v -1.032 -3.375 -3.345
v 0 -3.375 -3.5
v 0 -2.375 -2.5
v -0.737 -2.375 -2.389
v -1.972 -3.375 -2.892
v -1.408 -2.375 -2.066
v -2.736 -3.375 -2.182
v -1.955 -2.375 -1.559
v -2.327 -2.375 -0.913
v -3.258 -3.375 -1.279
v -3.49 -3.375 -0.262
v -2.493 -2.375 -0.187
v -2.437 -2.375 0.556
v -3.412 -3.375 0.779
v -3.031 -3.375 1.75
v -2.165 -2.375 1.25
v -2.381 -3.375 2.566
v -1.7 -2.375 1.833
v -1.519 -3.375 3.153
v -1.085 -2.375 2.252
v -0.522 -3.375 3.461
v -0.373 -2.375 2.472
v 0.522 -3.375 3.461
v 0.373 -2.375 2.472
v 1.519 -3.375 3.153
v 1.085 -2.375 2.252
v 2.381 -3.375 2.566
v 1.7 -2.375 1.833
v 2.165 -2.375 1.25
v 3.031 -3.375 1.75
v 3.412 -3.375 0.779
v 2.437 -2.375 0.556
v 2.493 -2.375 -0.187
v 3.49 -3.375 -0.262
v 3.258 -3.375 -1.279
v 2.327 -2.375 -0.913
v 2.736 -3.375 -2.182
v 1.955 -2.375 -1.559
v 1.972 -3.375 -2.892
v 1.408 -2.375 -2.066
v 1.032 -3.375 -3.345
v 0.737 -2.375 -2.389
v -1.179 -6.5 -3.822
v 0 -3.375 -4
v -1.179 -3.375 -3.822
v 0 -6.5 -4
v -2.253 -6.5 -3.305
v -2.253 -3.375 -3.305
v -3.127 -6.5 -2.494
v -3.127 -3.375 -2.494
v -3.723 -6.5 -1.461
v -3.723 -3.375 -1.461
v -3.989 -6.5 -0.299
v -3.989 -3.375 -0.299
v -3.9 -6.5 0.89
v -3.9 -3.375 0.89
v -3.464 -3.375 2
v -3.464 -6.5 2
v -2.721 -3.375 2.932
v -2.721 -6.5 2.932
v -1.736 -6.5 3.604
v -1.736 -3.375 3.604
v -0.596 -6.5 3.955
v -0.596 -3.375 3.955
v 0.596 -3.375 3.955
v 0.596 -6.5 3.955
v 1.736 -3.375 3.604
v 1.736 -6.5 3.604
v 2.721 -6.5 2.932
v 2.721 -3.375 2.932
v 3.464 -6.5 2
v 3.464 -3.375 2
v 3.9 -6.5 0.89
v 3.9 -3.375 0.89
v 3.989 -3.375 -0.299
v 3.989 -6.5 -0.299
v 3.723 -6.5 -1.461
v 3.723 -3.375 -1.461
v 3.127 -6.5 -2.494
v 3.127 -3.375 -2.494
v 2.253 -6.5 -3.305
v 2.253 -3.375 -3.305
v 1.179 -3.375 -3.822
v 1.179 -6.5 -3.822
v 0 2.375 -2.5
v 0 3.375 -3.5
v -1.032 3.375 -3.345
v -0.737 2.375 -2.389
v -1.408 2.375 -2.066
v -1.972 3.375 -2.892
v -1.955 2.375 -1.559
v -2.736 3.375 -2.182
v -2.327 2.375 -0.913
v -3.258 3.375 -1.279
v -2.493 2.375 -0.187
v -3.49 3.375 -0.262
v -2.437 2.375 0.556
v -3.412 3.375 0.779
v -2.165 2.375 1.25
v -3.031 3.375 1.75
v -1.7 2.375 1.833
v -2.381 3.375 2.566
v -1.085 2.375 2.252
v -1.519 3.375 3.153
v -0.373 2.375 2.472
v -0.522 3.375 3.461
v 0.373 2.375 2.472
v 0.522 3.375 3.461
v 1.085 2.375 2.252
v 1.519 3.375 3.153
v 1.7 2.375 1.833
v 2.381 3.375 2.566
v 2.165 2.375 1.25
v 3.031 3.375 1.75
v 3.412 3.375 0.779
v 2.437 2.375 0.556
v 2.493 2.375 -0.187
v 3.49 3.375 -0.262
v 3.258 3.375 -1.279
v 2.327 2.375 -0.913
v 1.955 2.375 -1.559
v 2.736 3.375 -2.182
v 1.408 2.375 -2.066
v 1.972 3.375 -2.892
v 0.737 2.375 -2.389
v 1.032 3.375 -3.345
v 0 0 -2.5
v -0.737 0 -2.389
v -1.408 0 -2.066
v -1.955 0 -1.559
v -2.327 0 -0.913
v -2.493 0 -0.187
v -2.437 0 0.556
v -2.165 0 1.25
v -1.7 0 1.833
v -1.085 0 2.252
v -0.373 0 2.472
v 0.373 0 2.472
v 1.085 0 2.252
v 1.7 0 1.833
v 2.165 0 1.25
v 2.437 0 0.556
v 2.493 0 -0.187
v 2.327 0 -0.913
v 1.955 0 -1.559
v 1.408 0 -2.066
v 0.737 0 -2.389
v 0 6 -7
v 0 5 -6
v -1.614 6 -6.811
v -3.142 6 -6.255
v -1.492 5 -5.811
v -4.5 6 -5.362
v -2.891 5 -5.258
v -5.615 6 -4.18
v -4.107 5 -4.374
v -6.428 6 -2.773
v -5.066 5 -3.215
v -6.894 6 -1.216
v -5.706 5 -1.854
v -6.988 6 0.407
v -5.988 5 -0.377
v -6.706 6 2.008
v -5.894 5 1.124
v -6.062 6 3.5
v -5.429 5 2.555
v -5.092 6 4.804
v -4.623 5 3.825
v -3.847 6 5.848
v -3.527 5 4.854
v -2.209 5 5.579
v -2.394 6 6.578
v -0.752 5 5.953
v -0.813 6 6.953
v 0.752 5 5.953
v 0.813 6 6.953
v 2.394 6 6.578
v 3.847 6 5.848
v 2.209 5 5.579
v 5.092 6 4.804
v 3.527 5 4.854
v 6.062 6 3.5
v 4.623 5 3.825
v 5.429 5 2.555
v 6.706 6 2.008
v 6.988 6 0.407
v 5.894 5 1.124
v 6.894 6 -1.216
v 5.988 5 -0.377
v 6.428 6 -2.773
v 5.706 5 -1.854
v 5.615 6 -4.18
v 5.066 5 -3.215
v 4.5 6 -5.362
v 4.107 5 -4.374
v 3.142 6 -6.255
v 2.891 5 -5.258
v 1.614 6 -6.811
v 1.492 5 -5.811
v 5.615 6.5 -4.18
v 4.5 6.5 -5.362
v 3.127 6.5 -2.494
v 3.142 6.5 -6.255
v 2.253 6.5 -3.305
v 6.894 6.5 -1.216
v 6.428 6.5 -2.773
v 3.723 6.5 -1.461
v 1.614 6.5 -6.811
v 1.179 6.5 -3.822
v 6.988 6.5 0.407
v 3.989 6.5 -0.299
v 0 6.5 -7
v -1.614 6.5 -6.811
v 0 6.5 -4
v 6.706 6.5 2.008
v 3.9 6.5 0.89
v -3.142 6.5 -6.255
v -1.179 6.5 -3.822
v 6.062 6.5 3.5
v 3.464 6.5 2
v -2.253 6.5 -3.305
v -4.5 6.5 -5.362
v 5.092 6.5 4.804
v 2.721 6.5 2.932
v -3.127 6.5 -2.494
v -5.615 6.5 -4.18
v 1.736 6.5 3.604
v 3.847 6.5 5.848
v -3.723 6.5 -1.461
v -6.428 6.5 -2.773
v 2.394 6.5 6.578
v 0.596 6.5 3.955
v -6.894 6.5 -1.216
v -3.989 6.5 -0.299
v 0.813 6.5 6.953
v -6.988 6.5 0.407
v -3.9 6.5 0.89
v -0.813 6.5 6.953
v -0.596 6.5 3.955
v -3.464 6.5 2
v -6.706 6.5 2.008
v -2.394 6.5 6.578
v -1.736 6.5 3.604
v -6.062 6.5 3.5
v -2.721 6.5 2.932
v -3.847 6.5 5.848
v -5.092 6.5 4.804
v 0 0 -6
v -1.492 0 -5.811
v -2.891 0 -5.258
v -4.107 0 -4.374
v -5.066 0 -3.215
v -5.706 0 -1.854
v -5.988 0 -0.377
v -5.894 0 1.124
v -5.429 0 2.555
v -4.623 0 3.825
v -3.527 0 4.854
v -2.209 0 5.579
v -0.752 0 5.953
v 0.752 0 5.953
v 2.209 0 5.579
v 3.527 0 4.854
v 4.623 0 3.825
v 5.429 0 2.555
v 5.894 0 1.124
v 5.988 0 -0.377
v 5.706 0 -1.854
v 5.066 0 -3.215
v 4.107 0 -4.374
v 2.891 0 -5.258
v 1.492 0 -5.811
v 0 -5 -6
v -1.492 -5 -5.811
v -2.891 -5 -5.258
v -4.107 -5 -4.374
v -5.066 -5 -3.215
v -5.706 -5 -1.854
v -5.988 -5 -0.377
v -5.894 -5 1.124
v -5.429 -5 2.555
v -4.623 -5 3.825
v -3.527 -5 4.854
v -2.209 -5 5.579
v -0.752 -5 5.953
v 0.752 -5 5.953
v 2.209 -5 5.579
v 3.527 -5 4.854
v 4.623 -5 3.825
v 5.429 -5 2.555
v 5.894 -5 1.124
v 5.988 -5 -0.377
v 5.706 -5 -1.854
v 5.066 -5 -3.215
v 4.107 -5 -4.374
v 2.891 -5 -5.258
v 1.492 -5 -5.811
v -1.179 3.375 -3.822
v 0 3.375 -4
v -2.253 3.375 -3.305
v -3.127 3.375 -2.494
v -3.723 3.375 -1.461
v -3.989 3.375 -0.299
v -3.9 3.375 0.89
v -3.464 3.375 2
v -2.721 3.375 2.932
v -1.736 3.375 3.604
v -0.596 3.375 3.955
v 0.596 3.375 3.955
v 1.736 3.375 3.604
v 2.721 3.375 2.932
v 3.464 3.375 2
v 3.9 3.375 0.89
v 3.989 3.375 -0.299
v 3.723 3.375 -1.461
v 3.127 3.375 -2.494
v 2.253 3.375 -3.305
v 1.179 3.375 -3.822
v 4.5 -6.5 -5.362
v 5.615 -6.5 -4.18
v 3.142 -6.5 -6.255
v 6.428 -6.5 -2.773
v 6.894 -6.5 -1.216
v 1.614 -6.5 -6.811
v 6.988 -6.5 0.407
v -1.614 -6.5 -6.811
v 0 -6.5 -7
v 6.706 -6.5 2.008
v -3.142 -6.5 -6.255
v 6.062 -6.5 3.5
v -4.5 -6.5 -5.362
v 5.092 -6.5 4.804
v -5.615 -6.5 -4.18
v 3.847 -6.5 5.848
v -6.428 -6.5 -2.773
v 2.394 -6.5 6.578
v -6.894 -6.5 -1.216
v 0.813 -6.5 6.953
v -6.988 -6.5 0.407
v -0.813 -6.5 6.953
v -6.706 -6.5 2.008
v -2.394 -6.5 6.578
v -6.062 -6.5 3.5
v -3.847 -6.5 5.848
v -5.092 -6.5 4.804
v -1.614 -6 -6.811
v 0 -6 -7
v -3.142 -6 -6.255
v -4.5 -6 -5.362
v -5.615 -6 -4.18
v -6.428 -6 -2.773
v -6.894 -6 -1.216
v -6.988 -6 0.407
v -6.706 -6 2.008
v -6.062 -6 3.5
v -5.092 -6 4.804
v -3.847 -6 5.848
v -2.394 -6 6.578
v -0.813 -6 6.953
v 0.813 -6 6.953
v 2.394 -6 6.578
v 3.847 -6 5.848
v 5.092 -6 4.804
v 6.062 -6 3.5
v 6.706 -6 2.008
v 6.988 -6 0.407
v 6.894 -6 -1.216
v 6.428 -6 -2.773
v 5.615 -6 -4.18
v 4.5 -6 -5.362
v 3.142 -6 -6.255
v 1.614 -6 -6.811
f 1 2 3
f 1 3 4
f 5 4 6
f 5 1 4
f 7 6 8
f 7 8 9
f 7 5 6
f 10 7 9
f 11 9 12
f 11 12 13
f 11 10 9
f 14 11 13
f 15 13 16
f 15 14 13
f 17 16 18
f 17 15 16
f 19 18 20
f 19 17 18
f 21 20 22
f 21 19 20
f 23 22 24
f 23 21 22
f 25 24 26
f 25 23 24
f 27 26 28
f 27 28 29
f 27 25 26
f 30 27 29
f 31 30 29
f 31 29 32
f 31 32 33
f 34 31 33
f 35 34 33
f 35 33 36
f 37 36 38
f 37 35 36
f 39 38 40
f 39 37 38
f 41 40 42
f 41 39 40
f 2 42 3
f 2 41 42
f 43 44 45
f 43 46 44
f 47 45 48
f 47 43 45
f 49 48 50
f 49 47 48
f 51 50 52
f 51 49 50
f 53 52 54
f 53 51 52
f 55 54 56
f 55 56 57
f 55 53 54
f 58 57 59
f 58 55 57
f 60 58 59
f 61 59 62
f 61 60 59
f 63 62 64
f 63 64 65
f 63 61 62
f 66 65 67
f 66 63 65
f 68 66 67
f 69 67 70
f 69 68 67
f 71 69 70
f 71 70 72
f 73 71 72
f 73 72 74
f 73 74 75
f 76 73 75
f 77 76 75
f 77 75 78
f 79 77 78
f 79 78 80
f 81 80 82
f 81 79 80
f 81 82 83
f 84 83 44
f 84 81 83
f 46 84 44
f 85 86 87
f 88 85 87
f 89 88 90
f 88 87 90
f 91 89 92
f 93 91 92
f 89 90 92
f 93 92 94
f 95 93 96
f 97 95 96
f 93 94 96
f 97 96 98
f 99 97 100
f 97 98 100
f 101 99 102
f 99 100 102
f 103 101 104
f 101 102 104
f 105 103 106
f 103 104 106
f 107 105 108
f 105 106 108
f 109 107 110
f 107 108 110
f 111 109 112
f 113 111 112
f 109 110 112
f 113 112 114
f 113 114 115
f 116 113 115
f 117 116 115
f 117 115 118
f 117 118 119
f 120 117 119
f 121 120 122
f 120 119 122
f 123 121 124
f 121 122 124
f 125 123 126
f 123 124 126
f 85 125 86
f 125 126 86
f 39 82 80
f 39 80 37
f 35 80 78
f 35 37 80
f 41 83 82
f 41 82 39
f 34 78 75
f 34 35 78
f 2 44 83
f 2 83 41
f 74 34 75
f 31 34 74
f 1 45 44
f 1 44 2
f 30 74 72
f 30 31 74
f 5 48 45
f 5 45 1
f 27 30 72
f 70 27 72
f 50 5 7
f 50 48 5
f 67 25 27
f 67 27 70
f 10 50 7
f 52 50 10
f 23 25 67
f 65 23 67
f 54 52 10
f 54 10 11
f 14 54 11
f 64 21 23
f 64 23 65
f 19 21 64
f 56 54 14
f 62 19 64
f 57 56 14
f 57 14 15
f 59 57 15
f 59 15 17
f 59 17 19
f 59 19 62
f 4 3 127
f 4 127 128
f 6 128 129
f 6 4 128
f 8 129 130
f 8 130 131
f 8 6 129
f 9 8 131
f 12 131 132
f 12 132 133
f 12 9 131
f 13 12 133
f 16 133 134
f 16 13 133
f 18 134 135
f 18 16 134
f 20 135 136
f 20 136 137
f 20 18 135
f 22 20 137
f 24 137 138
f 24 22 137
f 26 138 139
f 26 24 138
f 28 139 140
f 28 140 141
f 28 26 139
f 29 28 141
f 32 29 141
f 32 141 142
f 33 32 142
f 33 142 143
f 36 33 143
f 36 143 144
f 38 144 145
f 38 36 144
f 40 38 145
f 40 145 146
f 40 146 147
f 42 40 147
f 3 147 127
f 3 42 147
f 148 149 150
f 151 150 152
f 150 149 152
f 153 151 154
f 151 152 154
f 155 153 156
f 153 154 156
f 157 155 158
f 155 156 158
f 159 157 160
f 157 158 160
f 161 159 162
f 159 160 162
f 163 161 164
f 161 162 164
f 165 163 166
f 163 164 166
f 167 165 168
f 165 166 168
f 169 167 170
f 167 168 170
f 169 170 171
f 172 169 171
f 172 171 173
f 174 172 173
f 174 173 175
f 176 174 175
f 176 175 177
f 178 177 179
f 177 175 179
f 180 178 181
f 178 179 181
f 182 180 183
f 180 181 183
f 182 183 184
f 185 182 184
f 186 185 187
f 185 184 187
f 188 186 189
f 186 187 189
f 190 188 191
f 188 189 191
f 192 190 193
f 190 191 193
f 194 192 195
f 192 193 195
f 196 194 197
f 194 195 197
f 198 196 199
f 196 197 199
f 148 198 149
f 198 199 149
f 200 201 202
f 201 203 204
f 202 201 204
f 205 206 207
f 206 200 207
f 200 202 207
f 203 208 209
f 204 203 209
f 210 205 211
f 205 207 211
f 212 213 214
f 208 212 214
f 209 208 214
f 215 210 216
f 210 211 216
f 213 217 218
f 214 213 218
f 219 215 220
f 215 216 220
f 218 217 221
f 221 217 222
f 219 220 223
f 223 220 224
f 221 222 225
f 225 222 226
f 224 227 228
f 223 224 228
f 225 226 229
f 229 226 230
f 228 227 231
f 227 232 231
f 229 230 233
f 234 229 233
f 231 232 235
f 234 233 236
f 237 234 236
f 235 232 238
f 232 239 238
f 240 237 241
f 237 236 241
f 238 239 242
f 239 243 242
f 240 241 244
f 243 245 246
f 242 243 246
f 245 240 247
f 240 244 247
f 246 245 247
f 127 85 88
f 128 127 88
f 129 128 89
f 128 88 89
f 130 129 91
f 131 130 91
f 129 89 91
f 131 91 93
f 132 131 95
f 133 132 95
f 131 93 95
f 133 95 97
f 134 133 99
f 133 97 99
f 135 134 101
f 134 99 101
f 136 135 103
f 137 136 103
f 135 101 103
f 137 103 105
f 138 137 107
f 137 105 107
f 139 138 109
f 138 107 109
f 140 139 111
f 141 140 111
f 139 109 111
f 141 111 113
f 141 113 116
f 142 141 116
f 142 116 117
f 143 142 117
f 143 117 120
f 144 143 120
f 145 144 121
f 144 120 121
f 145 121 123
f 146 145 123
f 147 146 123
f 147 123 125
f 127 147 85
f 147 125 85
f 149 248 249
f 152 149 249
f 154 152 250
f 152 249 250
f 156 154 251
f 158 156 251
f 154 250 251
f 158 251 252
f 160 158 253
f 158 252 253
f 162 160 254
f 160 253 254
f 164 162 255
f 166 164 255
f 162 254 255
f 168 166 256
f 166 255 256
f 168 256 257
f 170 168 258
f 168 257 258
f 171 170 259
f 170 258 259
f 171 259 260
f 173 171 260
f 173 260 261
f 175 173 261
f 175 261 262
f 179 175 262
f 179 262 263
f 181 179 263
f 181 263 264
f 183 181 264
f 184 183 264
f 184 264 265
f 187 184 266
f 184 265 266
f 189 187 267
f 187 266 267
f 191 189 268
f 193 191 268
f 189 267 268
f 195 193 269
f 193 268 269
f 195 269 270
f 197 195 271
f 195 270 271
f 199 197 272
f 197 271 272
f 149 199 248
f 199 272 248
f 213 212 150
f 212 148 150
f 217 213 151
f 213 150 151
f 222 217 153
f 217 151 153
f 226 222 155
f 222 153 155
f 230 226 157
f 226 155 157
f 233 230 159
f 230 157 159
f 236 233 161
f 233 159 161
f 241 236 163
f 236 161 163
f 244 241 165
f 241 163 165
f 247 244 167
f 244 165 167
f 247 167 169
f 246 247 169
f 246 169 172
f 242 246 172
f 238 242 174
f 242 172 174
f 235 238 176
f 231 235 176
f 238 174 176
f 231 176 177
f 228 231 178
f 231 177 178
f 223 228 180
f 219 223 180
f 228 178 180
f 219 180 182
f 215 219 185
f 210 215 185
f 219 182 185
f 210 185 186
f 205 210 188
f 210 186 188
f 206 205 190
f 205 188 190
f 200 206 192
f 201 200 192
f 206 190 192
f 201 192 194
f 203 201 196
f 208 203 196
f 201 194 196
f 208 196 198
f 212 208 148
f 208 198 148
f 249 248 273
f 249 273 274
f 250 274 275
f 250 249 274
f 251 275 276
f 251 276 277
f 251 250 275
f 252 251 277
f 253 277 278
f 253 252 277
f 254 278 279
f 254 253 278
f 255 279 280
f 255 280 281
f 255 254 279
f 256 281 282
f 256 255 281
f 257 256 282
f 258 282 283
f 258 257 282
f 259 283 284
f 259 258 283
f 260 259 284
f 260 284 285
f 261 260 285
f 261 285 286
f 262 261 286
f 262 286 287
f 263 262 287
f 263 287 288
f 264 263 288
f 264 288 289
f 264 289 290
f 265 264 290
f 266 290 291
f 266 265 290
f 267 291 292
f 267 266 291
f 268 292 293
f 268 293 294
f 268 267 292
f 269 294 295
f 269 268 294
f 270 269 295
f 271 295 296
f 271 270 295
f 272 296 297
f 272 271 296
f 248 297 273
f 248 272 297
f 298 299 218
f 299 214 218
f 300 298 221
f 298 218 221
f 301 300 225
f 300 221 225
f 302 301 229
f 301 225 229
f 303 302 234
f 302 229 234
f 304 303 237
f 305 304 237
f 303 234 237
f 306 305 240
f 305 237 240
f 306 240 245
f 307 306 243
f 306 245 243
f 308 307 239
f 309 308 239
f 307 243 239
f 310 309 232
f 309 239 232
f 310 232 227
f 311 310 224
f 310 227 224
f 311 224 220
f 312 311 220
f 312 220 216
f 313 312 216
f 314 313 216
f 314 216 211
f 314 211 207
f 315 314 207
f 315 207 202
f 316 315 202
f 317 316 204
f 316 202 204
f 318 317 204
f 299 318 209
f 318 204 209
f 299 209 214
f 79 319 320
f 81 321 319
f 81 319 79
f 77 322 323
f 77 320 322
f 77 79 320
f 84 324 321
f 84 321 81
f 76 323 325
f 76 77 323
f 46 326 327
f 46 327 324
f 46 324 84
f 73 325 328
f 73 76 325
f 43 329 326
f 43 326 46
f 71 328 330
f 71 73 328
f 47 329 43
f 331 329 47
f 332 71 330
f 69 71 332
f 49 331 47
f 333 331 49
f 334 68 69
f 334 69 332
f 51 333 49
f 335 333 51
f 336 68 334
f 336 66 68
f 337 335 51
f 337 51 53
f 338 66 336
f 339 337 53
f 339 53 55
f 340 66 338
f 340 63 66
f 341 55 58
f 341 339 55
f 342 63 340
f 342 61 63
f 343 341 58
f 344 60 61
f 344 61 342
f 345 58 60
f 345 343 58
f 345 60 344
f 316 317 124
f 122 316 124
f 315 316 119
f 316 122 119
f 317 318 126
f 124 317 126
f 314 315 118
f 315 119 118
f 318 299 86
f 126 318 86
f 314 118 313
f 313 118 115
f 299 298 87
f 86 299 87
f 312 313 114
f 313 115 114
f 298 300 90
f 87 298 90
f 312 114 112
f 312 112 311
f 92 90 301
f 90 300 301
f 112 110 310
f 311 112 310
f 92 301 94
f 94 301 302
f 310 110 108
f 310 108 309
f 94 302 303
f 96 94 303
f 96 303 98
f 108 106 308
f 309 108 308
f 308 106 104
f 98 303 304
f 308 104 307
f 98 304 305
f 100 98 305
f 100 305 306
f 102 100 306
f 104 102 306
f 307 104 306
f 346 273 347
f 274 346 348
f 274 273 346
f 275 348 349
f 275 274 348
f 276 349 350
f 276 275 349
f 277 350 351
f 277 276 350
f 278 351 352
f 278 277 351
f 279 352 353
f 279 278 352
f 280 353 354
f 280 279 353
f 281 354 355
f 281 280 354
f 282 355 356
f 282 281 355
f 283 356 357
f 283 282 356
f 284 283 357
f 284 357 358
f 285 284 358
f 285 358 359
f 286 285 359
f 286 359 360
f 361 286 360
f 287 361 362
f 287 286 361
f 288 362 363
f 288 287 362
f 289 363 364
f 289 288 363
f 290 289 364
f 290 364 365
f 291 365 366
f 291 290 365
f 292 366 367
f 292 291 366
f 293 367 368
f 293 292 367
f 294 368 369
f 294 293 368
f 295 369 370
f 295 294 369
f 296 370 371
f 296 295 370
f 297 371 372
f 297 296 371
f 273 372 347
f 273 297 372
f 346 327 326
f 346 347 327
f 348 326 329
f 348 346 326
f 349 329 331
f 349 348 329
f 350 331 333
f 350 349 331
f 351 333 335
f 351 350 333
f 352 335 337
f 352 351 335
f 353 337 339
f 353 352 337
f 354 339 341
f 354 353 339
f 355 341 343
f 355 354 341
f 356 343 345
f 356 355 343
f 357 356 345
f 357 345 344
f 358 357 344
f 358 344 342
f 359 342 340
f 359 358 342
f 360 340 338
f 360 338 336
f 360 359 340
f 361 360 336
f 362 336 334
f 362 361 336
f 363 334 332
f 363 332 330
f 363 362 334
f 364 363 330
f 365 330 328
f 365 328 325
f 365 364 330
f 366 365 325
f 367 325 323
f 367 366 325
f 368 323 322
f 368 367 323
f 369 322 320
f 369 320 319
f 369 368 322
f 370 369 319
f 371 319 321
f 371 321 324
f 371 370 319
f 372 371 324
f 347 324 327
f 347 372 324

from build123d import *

# Parameters (mm, degrees)
CHAMFER1_SIZE = 1


with BuildPart() as part:
    # Sketch2 → Revolve1 (revolve)
    with BuildSketch(Plane(origin=(0, 0, 0), x_dir=(0, 0, -1), z_dir=(1, 0, 0))):
        Polygon((2.5, 0), (2.5, 3.375), (4, 3.375), (4, 6.5), (7, 6.5), (7, 6), (6, 5), (6, 0), align=None)
    revolve1 = revolve(axis=Axis((0, 0, 0), (0, 1, 0)))

    # Mirror1: Revolve1 across plane
    add(revolve1.mirror(Plane.ZX))

    # Chamfer1
    chamfer1_edges = [part.edges().sort_by_distance(p)[0] for p in [
        (0, -3.375, 2.5),
        (0, 3.375, 2.5),
    ]]
    chamfer(chamfer1_edges, length=CHAMFER1_SIZE)


solid = part.part
